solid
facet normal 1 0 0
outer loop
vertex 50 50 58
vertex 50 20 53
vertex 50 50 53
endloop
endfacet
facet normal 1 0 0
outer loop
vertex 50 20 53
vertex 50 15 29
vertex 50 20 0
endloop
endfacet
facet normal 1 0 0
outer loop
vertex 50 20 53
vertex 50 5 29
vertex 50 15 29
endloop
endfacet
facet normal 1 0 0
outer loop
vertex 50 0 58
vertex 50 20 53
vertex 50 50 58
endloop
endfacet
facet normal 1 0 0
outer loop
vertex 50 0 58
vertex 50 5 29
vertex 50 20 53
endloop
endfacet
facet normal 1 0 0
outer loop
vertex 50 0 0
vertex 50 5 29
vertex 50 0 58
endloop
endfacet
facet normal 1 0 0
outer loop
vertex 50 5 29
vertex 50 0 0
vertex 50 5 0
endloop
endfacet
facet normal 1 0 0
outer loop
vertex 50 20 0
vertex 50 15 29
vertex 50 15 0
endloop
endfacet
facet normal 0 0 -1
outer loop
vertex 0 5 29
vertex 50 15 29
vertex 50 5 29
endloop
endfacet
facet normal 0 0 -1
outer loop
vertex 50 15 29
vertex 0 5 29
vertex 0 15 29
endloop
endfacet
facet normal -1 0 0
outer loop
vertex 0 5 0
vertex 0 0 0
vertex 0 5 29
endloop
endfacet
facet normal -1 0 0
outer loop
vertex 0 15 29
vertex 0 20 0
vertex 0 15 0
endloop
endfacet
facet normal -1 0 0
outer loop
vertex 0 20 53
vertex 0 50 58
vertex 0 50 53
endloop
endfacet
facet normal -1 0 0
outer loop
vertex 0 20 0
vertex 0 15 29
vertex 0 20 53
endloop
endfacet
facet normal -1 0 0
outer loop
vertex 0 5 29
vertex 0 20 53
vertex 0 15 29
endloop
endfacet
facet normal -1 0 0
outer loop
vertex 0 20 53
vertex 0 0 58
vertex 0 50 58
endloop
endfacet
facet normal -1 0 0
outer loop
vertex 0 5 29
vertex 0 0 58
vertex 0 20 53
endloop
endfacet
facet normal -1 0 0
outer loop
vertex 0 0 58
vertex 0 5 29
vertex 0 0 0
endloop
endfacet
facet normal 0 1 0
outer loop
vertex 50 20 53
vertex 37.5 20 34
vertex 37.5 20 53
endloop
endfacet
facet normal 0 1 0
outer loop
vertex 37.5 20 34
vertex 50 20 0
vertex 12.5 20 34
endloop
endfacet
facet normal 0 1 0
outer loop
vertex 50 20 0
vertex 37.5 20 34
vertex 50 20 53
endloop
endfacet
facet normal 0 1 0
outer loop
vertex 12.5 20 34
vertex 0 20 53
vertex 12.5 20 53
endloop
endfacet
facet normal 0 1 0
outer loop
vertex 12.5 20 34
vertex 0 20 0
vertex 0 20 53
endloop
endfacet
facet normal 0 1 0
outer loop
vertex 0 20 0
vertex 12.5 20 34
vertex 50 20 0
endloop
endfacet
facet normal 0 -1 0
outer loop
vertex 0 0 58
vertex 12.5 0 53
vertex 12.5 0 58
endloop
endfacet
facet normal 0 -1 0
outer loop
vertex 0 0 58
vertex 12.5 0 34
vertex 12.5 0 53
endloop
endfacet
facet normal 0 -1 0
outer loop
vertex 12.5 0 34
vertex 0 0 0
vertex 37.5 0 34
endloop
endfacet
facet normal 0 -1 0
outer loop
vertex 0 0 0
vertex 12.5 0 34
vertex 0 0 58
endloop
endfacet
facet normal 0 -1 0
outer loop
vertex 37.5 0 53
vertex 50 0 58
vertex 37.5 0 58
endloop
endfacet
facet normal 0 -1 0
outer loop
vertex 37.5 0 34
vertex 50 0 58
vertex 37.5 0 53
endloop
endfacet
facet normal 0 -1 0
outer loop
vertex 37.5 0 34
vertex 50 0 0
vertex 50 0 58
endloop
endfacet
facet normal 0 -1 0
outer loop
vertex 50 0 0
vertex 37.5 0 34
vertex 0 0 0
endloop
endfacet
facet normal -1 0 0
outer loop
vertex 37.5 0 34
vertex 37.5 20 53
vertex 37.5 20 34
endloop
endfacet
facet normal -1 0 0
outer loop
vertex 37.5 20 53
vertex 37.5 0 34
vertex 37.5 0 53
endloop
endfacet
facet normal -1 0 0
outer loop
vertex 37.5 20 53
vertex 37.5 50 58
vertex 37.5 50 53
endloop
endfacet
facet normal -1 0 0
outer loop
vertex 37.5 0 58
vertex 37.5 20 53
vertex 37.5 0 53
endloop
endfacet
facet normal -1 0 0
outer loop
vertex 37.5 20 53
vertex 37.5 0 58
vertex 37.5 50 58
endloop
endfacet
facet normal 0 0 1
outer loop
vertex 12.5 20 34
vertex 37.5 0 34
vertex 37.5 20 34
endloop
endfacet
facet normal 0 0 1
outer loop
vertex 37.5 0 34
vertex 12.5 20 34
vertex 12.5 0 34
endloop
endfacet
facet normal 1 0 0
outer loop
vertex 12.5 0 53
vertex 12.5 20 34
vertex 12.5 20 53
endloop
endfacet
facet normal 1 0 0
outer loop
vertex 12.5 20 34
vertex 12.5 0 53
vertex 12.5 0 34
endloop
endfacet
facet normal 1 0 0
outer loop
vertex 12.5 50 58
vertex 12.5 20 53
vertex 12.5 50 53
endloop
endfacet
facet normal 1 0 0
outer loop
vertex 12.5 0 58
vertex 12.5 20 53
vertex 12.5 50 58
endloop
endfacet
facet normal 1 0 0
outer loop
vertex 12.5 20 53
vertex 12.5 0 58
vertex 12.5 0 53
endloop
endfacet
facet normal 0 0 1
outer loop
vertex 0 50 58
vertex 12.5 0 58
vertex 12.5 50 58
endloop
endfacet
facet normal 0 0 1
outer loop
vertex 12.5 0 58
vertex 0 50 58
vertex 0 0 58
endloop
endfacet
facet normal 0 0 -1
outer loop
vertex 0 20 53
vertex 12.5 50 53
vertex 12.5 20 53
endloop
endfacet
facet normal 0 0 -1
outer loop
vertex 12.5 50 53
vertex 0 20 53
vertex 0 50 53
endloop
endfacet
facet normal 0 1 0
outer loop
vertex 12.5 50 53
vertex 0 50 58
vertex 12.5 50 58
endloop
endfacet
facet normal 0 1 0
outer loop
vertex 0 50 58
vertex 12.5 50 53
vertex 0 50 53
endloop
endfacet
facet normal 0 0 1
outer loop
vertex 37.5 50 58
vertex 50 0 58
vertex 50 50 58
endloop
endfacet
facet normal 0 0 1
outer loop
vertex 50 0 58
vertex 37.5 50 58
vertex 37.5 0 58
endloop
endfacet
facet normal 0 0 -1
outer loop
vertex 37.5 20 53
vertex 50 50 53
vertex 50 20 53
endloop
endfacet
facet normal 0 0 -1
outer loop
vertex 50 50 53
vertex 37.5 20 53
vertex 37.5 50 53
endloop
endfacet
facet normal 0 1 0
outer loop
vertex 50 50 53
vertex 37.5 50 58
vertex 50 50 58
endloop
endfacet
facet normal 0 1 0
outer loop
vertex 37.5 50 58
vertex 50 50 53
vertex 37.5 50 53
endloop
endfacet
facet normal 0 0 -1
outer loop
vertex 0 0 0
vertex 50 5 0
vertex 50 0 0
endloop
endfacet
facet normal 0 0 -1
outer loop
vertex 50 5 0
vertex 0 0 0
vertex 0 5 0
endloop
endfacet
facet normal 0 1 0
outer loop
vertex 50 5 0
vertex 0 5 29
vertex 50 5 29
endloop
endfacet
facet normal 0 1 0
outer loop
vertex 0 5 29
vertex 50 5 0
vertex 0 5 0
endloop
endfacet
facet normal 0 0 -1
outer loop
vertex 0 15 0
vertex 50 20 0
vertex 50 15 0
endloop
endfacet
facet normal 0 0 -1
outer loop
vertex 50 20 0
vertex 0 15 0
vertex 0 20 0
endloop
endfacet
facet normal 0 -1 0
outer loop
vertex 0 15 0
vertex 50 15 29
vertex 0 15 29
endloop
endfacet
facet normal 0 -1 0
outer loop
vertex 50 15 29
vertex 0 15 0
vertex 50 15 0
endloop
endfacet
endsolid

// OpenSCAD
LEG_HEIGHT = 30;
LEG_SPACING = 10;
LEG_WIDTH = 50;
LEG_THICK = 5;

UPPER_WIDTH = 50;
UPPER_HEIGHT = 25;
// slot to fit the shower cap
UPPER_HOLE_WIDTH = 25;

module leg() {
    cube([LEG_WIDTH,LEG_THICK,LEG_HEIGHT]);
}

module cap() {
    cube([(UPPER_WIDTH-UPPER_HOLE_WIDTH)/2,50,5]);
}

leg();
translate([0,LEG_SPACING+LEG_THICK,0]) leg();
translate([-(UPPER_WIDTH-LEG_WIDTH)/2,0,LEG_HEIGHT-1]) {
    difference() {
        cube([UPPER_WIDTH,LEG_THICK*2+LEG_SPACING,UPPER_HEIGHT]);
        translate([(UPPER_WIDTH-UPPER_HOLE_WIDTH)/2,-50,5])
            cube([UPPER_HOLE_WIDTH,100,100]);
    }
    translate([0,0,UPPER_HEIGHT-1]) {
        cap();
        translate([(UPPER_WIDTH+UPPER_HOLE_WIDTH)/2,0,0])
            cap();
    }
}
